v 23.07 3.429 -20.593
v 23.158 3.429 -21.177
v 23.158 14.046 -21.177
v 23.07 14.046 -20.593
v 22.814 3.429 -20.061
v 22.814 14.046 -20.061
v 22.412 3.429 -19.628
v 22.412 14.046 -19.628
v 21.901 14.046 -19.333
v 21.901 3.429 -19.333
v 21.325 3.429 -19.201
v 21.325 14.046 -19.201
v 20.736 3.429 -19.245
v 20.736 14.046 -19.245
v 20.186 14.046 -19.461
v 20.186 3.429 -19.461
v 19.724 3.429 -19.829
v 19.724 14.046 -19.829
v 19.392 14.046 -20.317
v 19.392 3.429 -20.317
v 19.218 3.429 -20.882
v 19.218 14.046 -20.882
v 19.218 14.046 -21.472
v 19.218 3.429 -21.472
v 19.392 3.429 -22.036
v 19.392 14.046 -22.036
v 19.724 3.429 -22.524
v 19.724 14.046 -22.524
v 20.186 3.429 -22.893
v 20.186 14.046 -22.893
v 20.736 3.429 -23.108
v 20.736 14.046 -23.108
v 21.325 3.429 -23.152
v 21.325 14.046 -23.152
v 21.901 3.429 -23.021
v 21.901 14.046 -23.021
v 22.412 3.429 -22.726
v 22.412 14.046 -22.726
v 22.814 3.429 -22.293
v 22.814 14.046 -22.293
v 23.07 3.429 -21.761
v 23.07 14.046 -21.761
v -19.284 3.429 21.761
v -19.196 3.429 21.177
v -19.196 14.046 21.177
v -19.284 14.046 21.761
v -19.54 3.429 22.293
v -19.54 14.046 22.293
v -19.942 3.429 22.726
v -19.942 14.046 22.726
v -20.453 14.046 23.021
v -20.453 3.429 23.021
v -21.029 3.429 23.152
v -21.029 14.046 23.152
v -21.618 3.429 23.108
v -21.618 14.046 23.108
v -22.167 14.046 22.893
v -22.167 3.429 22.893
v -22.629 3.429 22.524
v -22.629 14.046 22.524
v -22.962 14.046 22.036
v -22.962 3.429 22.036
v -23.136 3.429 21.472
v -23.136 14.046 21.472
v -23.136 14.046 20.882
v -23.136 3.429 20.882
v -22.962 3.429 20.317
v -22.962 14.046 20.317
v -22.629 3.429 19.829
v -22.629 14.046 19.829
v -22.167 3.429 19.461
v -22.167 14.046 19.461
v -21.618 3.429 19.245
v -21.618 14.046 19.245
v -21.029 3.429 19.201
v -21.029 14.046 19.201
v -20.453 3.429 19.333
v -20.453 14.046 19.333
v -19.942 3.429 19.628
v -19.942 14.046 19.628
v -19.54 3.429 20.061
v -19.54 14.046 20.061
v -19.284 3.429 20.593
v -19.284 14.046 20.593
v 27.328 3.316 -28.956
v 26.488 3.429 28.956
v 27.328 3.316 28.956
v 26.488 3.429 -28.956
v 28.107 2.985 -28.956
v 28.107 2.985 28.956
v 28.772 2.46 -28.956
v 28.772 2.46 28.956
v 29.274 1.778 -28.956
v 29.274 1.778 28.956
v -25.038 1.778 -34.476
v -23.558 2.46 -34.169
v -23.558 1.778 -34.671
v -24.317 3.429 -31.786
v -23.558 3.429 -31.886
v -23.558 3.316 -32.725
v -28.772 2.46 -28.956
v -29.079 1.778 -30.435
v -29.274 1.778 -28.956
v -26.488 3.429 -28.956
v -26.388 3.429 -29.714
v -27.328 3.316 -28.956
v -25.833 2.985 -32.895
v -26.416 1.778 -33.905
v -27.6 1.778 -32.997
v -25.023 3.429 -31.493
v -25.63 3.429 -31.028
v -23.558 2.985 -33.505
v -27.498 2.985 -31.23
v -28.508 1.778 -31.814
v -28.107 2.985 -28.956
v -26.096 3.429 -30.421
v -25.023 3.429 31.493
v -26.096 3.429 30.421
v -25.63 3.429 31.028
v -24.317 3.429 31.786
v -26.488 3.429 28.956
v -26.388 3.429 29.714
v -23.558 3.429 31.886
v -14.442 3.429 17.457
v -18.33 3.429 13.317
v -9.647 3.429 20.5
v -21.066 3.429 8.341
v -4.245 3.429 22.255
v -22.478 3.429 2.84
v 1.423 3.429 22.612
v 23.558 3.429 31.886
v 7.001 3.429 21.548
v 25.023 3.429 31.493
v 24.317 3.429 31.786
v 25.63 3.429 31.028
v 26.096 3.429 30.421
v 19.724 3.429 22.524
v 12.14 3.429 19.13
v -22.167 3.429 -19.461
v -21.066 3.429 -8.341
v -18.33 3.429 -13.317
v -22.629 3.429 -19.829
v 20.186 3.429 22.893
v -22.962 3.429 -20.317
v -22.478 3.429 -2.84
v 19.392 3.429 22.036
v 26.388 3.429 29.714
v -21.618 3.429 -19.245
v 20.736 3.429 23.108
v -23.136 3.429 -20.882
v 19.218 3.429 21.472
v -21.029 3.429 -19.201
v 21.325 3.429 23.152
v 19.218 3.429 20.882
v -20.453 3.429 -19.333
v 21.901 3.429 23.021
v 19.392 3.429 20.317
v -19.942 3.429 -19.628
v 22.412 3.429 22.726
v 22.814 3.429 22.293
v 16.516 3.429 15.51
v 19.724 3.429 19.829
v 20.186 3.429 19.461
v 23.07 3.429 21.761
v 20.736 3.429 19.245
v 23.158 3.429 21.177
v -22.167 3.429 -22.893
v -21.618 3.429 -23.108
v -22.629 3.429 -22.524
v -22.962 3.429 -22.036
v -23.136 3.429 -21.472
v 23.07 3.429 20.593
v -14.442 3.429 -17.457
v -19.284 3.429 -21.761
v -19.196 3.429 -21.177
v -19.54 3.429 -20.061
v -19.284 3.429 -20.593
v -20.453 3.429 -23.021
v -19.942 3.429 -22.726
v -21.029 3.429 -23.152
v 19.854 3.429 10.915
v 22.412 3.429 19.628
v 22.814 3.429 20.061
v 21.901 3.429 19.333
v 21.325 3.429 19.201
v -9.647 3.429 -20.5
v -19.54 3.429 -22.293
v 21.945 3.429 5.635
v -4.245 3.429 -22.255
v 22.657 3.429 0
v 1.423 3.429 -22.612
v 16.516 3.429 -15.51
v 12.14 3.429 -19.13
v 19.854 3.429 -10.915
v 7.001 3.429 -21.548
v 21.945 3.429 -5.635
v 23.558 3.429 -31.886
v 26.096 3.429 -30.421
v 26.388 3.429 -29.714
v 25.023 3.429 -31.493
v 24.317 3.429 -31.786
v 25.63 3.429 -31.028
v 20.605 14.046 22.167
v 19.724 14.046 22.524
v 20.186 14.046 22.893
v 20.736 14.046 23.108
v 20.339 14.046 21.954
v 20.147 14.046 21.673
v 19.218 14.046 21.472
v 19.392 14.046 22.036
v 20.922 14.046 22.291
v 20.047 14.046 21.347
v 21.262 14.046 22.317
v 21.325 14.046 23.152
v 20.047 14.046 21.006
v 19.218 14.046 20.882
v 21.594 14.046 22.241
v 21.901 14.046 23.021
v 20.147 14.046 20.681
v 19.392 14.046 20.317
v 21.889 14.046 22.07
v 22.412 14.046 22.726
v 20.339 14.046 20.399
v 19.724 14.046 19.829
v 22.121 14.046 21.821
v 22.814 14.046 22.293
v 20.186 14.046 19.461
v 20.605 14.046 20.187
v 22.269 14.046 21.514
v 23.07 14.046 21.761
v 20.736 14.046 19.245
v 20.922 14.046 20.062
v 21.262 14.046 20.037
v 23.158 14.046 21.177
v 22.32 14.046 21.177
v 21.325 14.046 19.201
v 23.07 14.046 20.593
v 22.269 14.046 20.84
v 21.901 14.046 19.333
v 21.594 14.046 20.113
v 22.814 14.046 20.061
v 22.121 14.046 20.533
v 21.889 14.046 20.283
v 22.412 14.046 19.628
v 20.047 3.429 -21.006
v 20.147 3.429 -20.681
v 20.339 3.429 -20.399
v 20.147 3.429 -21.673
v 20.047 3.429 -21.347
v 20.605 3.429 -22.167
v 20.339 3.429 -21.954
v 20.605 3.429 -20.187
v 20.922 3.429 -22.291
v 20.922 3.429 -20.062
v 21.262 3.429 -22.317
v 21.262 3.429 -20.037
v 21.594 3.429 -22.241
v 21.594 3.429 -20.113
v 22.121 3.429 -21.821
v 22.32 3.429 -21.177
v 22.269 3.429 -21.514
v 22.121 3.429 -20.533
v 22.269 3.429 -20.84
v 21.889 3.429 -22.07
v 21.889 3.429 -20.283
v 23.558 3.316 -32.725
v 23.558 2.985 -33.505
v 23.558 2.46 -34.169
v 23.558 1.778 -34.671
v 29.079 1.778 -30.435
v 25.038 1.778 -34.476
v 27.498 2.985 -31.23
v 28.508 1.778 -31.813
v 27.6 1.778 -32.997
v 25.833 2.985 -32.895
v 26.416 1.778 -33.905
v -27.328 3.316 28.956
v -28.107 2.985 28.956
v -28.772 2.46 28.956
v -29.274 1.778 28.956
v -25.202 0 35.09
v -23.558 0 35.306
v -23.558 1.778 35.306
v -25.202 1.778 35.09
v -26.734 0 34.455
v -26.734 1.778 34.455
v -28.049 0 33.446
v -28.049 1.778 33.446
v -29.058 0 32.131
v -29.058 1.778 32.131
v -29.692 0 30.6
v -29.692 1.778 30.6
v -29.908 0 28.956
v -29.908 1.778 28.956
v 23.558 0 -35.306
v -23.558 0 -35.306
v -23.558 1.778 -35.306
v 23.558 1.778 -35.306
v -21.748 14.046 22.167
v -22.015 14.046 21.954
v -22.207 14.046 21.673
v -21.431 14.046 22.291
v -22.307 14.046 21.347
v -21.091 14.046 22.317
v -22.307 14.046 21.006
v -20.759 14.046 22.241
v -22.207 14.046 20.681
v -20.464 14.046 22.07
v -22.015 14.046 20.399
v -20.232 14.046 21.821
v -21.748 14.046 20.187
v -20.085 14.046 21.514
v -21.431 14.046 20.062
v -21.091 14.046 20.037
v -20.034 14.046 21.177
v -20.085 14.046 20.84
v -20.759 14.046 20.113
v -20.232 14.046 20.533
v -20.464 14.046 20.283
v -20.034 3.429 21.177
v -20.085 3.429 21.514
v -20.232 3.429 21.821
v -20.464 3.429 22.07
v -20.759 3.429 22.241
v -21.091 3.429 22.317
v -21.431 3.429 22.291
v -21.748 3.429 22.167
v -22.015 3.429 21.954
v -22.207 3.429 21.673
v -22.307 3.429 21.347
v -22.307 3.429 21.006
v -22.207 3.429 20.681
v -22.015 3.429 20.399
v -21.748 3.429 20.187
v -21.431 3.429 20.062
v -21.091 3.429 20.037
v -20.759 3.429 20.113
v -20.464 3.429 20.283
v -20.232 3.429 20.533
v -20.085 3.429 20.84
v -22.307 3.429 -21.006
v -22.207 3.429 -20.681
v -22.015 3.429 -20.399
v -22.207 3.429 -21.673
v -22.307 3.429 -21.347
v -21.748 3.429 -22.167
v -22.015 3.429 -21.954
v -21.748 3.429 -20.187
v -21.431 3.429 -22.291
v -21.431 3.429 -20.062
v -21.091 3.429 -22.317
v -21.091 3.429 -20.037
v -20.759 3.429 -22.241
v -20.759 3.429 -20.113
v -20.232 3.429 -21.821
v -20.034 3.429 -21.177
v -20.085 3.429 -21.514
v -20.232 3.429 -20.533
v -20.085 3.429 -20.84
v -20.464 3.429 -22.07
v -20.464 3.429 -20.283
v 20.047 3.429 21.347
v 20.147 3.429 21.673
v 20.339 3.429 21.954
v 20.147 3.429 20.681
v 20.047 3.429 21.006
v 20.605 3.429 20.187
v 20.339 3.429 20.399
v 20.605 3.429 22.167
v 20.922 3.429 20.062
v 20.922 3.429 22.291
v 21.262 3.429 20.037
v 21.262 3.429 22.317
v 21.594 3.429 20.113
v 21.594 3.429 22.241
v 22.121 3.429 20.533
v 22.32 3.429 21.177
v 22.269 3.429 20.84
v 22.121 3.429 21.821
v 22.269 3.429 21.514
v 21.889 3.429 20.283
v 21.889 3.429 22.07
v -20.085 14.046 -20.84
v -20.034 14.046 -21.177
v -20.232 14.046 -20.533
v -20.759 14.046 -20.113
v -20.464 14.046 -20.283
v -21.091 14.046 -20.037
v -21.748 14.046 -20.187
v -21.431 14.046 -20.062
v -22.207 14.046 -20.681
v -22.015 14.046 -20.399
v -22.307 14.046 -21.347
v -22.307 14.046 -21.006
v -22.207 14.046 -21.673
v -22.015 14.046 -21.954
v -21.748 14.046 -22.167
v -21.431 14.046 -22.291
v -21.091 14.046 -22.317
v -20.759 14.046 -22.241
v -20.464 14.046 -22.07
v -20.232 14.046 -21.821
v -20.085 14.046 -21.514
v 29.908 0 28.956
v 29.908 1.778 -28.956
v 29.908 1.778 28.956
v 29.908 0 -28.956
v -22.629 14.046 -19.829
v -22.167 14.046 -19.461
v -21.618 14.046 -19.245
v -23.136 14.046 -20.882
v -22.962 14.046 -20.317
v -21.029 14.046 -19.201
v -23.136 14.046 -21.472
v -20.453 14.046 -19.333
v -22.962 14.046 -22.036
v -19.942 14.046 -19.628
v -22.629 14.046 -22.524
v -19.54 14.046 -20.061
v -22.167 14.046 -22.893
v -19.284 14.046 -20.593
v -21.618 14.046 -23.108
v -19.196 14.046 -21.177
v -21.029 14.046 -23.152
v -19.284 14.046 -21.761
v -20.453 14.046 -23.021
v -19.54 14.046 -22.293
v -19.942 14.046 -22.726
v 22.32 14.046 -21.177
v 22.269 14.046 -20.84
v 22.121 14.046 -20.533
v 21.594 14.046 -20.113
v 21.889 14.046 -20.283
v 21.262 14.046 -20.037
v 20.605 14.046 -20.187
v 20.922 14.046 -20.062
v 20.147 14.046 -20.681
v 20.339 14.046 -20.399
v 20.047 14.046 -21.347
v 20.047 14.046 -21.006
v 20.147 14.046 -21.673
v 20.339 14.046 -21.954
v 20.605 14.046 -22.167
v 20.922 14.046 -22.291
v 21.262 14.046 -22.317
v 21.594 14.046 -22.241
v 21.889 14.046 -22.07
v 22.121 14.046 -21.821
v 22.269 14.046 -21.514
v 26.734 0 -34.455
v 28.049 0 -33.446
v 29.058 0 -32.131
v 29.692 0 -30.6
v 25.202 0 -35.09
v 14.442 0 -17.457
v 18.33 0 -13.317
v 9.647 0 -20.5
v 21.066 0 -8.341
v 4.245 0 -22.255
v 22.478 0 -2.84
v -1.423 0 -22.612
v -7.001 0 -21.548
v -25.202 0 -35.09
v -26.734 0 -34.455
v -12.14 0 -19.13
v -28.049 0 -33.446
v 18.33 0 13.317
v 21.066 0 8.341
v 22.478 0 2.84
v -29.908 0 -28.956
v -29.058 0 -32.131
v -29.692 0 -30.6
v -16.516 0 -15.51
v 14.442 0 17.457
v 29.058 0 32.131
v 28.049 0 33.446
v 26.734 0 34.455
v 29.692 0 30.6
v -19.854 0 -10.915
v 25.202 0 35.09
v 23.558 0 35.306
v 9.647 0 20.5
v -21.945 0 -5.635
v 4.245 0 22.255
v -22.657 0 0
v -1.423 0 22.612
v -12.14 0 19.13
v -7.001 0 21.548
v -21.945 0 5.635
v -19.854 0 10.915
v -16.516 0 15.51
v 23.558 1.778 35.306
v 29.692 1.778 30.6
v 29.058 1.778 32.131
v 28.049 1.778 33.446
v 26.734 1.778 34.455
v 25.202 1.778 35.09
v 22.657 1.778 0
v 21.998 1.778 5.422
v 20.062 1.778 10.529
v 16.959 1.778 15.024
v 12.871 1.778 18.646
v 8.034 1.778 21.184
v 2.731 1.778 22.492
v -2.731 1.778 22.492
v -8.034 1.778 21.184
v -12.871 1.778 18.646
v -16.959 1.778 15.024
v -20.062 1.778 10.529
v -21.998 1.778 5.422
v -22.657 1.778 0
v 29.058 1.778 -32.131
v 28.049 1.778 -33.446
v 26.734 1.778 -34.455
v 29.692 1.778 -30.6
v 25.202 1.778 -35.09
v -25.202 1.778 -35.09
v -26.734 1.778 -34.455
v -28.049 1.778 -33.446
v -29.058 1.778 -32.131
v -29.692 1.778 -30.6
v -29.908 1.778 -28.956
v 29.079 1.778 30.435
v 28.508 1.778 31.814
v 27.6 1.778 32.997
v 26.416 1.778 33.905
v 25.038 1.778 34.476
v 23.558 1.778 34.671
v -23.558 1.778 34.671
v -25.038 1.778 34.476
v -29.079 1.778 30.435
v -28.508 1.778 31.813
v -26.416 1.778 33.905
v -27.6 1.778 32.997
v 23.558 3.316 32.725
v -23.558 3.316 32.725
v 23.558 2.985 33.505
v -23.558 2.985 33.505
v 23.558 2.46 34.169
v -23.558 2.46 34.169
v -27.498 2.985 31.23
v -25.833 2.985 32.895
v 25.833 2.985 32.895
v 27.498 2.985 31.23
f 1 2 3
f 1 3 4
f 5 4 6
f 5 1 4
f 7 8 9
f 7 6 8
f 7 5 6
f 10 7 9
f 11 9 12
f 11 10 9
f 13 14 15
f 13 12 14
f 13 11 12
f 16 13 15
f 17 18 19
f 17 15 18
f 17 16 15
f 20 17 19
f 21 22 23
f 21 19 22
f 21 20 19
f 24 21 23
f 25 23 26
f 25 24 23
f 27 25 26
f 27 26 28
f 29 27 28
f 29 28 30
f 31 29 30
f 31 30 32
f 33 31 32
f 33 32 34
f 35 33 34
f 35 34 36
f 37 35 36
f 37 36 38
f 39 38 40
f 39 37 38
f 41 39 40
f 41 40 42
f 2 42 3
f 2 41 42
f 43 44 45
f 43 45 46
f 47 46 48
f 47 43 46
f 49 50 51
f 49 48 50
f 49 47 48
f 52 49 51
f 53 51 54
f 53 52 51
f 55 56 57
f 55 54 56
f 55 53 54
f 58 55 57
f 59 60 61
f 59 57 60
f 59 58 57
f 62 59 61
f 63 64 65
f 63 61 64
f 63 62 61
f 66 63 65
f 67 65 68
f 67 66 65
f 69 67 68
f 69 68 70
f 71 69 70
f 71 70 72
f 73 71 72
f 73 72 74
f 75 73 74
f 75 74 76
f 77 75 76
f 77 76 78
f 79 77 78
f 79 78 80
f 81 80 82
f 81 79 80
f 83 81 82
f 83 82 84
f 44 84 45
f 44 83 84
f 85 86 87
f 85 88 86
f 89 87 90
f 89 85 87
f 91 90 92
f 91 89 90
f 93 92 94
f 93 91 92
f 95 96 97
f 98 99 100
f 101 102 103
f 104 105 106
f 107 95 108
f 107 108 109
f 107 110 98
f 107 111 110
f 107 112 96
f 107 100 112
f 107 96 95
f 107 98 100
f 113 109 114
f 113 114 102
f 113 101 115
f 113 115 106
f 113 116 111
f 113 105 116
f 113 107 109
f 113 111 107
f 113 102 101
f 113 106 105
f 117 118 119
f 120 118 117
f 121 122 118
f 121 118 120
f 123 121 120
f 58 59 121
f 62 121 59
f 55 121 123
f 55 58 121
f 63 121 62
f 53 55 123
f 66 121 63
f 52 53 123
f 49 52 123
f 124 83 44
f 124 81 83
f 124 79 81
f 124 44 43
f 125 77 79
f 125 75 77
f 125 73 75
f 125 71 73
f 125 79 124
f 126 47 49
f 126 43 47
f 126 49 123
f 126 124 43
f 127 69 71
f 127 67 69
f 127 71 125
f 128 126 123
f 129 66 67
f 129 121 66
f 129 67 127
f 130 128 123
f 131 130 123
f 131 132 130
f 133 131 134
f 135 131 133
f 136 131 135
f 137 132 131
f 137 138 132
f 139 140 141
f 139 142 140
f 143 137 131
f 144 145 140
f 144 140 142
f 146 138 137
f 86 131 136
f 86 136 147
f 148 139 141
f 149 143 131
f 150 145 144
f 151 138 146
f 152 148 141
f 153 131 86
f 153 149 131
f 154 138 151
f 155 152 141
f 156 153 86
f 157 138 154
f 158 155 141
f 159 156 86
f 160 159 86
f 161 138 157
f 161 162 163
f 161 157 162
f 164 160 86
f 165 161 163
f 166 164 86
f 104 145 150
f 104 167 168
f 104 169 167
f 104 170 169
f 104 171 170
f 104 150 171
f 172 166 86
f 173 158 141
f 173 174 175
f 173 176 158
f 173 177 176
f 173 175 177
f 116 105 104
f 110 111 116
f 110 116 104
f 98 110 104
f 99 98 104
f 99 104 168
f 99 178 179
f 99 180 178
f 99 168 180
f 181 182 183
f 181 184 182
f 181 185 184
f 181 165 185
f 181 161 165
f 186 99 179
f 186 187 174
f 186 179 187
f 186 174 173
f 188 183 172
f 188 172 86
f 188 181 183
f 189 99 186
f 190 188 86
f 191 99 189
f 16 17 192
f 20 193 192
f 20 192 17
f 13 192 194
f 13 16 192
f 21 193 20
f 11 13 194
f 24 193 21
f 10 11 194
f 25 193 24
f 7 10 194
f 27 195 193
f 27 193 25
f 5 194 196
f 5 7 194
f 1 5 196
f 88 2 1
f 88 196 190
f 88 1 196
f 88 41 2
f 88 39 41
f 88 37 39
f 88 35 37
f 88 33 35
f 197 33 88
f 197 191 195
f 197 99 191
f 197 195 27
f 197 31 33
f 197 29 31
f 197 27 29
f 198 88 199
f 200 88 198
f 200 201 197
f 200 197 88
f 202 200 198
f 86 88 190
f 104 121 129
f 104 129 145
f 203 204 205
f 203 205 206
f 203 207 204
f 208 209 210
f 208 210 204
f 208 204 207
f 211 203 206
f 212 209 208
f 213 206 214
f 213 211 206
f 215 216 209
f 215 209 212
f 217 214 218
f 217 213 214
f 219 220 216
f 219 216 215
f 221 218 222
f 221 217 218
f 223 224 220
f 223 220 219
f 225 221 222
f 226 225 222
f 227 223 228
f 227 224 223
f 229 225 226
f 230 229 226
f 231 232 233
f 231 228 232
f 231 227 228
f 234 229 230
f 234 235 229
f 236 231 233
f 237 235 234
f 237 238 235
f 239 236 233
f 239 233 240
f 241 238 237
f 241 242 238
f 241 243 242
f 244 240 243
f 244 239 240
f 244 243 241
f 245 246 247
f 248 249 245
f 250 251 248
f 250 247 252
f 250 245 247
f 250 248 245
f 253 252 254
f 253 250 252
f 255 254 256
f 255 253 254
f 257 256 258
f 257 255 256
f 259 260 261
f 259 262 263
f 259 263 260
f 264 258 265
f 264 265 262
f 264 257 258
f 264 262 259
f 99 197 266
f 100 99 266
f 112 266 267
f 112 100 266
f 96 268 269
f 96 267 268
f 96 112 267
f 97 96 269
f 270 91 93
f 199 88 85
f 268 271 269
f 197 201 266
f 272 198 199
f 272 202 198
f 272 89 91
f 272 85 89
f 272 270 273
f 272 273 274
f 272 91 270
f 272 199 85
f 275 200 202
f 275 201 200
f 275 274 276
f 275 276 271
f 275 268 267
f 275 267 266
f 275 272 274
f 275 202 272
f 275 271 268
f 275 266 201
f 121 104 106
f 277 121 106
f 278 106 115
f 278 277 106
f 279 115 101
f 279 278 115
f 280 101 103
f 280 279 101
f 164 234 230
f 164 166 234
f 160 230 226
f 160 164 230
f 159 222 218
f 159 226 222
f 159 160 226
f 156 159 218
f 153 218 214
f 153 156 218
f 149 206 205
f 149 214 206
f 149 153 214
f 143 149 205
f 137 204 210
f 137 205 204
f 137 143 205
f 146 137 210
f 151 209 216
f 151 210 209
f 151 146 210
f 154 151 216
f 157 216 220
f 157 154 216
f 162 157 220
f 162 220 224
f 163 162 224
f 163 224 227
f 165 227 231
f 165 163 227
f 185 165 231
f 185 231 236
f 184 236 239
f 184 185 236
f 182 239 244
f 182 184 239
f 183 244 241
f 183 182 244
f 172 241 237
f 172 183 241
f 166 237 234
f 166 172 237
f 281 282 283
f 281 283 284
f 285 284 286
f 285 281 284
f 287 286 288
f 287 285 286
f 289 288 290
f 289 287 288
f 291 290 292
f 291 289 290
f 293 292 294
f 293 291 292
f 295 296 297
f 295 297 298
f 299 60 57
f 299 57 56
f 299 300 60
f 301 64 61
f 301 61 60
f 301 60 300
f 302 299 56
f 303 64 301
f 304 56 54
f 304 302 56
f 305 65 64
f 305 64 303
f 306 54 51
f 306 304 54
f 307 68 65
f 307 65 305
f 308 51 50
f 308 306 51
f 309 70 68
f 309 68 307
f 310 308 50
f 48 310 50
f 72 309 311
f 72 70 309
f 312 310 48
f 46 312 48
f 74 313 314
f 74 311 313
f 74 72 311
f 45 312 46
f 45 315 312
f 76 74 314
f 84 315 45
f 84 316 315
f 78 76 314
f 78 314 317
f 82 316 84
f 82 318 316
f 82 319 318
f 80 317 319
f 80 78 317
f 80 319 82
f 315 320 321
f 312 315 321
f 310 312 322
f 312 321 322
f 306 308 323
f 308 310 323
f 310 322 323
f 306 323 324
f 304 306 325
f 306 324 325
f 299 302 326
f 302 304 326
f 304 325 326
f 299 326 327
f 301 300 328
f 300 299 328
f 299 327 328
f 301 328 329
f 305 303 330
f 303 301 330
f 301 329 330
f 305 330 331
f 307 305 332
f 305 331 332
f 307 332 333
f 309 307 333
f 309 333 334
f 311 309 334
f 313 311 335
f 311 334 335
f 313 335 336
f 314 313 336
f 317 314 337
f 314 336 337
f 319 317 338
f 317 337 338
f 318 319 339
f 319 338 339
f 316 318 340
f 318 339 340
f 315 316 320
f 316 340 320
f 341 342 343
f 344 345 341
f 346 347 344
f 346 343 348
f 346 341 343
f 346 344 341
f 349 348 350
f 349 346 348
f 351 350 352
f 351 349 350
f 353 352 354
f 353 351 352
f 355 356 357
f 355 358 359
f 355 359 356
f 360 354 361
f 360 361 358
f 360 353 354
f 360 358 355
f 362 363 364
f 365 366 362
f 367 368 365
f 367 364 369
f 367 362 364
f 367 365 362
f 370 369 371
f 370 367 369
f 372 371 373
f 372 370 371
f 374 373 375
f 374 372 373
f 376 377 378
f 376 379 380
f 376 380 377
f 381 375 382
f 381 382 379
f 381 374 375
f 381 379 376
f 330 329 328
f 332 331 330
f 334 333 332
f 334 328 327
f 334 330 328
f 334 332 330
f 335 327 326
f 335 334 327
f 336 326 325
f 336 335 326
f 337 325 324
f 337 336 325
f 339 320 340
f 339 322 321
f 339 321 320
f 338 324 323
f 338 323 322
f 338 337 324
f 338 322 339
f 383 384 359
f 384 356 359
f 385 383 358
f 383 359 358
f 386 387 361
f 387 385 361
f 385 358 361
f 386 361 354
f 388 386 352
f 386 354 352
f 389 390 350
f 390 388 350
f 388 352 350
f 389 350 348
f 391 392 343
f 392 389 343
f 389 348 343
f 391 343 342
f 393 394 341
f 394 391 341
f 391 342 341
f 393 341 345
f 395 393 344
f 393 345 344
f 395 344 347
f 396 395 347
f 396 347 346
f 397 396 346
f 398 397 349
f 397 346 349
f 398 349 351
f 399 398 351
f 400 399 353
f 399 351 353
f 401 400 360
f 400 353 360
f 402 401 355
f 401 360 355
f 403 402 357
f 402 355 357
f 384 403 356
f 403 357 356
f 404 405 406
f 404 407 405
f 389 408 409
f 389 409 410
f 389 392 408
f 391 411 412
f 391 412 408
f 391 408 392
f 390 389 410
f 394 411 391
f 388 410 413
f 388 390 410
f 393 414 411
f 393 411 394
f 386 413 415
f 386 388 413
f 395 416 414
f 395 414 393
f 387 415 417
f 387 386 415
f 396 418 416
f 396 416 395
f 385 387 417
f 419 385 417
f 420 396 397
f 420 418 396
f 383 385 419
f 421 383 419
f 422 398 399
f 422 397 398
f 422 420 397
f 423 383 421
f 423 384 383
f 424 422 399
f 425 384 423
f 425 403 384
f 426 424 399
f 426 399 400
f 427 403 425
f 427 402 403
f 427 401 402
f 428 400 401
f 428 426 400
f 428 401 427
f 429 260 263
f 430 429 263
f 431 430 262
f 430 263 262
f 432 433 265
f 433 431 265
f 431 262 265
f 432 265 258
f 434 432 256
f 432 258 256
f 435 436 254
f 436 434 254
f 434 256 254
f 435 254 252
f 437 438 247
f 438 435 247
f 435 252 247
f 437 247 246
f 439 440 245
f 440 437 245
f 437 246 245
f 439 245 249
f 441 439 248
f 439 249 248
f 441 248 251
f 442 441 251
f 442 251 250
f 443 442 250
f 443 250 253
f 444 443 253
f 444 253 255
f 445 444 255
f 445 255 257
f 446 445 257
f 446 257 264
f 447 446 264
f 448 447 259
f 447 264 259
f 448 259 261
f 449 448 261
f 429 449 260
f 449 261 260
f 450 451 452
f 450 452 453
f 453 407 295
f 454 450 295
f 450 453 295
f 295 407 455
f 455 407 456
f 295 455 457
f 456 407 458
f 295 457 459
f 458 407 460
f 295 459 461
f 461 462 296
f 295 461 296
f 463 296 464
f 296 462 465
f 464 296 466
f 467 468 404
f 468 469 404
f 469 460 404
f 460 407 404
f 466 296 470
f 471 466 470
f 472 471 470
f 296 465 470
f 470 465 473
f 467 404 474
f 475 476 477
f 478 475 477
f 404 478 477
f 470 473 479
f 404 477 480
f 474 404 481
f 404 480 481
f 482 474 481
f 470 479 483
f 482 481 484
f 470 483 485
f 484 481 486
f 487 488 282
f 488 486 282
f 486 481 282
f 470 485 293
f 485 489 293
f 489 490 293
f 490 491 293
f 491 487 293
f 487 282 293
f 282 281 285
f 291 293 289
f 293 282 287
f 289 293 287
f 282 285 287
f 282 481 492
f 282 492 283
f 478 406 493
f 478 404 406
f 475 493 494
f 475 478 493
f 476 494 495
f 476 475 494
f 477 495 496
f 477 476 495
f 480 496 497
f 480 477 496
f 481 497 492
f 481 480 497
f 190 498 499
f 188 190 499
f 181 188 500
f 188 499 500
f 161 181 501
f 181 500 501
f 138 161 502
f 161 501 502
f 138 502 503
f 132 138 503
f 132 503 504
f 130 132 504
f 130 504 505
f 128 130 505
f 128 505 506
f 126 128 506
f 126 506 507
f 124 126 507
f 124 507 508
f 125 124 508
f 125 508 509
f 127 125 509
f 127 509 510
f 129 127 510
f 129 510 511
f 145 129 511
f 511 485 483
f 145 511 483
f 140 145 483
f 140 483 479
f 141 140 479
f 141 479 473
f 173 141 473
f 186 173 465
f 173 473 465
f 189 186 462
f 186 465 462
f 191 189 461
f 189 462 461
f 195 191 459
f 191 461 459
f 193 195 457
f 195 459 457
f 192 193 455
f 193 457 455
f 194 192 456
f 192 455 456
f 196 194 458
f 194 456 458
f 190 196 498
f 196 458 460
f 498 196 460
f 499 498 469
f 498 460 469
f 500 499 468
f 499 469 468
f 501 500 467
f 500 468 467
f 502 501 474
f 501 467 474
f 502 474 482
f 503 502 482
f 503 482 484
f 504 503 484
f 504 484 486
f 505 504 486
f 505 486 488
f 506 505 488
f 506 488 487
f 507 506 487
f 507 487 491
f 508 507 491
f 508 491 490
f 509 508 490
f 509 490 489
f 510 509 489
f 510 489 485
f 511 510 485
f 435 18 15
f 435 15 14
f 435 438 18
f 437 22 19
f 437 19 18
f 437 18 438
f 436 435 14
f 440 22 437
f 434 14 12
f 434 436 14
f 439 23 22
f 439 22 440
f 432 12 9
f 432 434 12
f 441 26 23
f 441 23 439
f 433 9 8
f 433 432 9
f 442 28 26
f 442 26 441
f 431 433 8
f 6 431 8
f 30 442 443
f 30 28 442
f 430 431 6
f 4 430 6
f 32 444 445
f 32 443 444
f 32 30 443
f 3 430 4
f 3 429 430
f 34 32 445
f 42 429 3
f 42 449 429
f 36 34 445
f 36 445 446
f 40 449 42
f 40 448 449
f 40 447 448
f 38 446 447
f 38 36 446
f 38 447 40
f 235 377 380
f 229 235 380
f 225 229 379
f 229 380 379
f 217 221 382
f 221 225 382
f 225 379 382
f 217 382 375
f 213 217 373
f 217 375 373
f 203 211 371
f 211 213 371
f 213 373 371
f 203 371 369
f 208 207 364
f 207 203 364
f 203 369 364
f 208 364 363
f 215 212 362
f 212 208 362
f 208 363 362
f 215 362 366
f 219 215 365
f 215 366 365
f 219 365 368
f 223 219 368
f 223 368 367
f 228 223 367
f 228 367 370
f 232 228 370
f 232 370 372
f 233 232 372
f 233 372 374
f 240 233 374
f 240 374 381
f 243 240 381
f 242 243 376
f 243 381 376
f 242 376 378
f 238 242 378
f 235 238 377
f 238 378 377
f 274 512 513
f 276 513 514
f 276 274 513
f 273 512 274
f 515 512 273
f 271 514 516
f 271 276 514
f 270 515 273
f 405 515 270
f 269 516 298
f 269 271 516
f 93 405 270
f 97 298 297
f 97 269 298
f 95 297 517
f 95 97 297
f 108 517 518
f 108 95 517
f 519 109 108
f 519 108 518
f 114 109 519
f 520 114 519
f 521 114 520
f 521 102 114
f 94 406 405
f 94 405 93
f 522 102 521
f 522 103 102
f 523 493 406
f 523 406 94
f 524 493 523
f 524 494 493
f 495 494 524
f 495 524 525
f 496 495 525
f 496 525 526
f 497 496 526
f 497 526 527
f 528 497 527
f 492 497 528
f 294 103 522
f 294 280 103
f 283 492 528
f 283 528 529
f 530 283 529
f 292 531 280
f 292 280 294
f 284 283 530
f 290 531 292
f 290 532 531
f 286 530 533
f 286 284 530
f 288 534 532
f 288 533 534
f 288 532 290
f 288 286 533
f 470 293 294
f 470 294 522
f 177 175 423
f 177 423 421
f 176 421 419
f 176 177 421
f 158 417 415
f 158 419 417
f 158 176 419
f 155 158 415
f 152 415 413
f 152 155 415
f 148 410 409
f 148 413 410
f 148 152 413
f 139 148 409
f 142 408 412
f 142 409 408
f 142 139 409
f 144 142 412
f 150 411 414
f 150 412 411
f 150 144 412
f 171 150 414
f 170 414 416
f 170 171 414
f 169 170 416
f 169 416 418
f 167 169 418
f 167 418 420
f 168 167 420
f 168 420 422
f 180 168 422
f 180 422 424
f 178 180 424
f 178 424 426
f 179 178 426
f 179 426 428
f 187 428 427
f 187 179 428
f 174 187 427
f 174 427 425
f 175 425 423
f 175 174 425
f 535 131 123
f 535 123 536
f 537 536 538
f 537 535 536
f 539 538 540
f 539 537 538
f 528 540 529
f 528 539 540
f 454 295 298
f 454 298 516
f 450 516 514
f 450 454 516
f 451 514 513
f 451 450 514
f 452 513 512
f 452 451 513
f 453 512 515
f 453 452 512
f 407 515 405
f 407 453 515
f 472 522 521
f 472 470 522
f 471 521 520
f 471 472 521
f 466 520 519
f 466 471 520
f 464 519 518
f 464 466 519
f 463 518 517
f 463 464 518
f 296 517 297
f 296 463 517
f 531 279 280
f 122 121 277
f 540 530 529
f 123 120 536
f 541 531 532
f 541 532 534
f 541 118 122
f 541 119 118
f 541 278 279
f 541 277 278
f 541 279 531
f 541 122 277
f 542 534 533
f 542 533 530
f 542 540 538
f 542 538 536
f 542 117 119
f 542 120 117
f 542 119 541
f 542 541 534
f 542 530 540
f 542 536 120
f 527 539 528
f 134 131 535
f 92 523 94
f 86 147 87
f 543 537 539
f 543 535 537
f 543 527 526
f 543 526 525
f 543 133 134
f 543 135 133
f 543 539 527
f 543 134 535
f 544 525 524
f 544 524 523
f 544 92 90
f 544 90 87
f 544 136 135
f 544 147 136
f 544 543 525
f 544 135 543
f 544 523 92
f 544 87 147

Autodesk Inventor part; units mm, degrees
ref_plane "YZ Plane" through (0, 0, 0) normal (1, 0, 0) x (0, 1, 0)
ref_plane "XZ Plane" through (0, 0, 0) normal (0, 1, 0) x (-1, 0, 0)
ref_plane "XY Plane" through (0, 0, 0) normal (0, 0, 1) x (1, 0, 0)
sketch "Sketch1" plane through (0, 0, 0) normal (0, 1, 0) x (-1, 0, 0)
  circle A0 centre (0, 0) radius 22.6568
  line L0 (0, 35.306) -> (23.5585, 35.306)
  line L1 (29.9085, 28.956) -> (29.9085, -28.956)
  line L2 (23.5585, -35.306) -> (-23.5585, -35.306)
  line L3 (-29.9085, -28.956) -> (-29.9085, 28.956)
  line L4 (-23.5585, 35.306) -> (0, 35.306)
  arc A1 (29.9085, 28.956) -> (23.5585, 35.306) centre (23.5585, 28.956) ccw
  arc A2 (23.5585, -35.306) -> (29.9085, -28.956) centre (23.5585, -28.956) ccw
  arc A3 (-29.9085, -28.956) -> (-23.5585, -35.306) centre (-23.5585, -28.956) ccw
  arc A4 (-23.5585, 35.306) -> (-29.9085, 28.956) centre (-23.5585, 28.956) ccw
  point P0 (29.9085, 35.306)
  point P1 (29.9085, -35.306)
  point P2 (-29.9085, -35.306)
  dimension "d0" = 45.3136
  dimension "d1" = 35.306
  dimension "d2" = 29.9085
  dimension "d3" = 70.612
  dimension "d4" = 59.817
  dimension "d5" = 6.35
extrude "Extrusion1" add sketch "Sketch1" along normal blind 1.778
sketch "Sketch2" plane through (0, 1.778, 0) normal (0, 1, 0) x (1, 0, 0)
  circle A0 centre (0, 0) radius 22.6568 projected
  line L0 (-23.5585, -35.306) -> (23.5585, -35.306) projected
  line L1 (29.9085, -28.956) -> (29.9085, 28.956) projected
  line L2 (23.5585, 35.306) -> (-23.5585, 35.306) projected
  line L3 (-29.9085, 28.956) -> (-29.9085, -28.956) projected
  line L4 (0, 35.306) -> (0, 34.671)
  line L5 (29.9085, 0) -> (29.2735, 0)
  line L6 (0, -35.306) -> (0, -34.671)
  line L7 (-29.9085, 0) -> (-29.2735, 0)
  line L8 (0, 34.671) -> (-23.5585, 34.671)
  line L9 (-29.2735, 28.956) -> (-29.2735, 0)
  line L10 (0, 34.671) -> (23.5585, 34.671)
  line L11 (29.2735, 28.956) -> (29.2735, 0)
  line L12 (0, -34.671) -> (23.5585, -34.671)
  line L13 (29.2735, -28.956) -> (29.2735, 0)
  line L14 (0, -34.671) -> (-23.5585, -34.671)
  line L15 (-29.2735, -28.956) -> (-29.2735, 0)
  arc A1 (23.5585, -34.671) -> (29.2735, -28.956) centre (23.5585, -28.956) ccw
  arc A2 (29.2735, 28.956) -> (23.5585, 34.671) centre (23.5585, 28.956) ccw
  arc A3 (-23.5585, 34.671) -> (-29.2735, 28.956) centre (-23.5585, 28.956) ccw
  arc A4 (-29.2735, -28.956) -> (-23.5585, -34.671) centre (-23.5585, -28.956) ccw
  circle A5 centre (0, 0) radius 22.6568
  dimension "d8" = 0.635
  dimension "d9" = 0.635
  dimension "d10" = 0.635
  dimension "d11" = 0.635
  dimension "d12" = 5.715
extrude "Extrusion2" add sketch "Sketch2" along normal blind 1.651
fillet "Fillet1" radius 3.175 8 edges at (27.5996, 3.429, -32.9971) (0, 3.429, -34.671) (-27.5996, 3.429, -32.9971) (-29.2735, 3.429, 0) (-27.5996, 3.429, 32.9971) (0, 3.429, 34.671) (27.5996, 3.429, 32.9971) (29.2735, 3.429, 0)
sketch "Sketch3" plane through (0, 3.429, 0) normal (0, 1, 0) x (1, 0, 0)
  circle A0 centre (0, 0) radius 22.6568 projected
  circle A1 centre (0, 0) radius 25.146
  line L0 (-26.2636, 0) -> (-25.5008, 22.4355)
  line L1 (-22.4355, 25.5008) -> (0, 26.2636)
  line L2 (0, 26.2636) -> (22.4355, 25.5008)
  line L3 (25.5008, 22.4355) -> (26.2636, 0)
  line L4 (26.2636, 0) -> (25.5008, -22.4355)
  line L5 (22.4355, -25.5008) -> (0, -26.2636)
  line L6 (0, -26.2636) -> (-22.4355, -25.5008)
  line L7 (-25.5008, -22.4355) -> (-26.2636, 0)
  arc A2 (25.5008, 22.4355) -> (22.4355, 25.5008) centre (22.3276, 22.3276) ccw
  arc A3 (22.4355, -25.5008) -> (25.5008, -22.4355) centre (22.3276, -22.3276) ccw
  arc A4 (-25.5008, -22.4355) -> (-22.4355, -25.5008) centre (-22.3276, -22.3276) ccw
  arc A5 (-22.4355, 25.5008) -> (-25.5008, 22.4355) centre (-22.3276, 22.3276) ccw
  circle A6 centre (-21.1768, 21.1768) radius 1.9812
  circle A7 centre (-21.1768, 21.1768) radius 1.143
  circle A8 centre (21.1768, 21.1768) radius 1.9812
  circle A9 centre (21.1768, 21.1768) radius 1.143
  circle A10 centre (21.1768, -21.1768) radius 1.9812
  circle A11 centre (21.1768, -21.1768) radius 1.143
  circle A12 centre (-21.1768, -21.1768) radius 1.9812
  circle A13 centre (-21.1768, -21.1768) radius 1.143
  point P0 (25.4, 25.4)
  point P1 (-25.4, -25.4)
  point P2 (-25.4, 25.4)
  point P3 (25.4, -25.4)
  dimension "d20" = 50.8
  dimension "d36" = 50.292
  dimension "d39" = 50.8
  dimension "d40" = 50.8
  dimension "d41" = 50.8
  dimension "d46" = 3.175
  dimension "d47" = 3.9624
  dimension "d48" = 2.286
  dimension "d49" = 3.9624
  dimension "d50" = 2.286
  dimension "d51" = 3.9624
  dimension "d52" = 2.286
  dimension "d53" = 3.9624
  dimension "d54" = 2.286
extrude "Extrusion4" add sketch "Sketch3" along normal blind 10.6172 contours A6 | A8 | A10 | A12
properties part number "Speaker Front Plate"
